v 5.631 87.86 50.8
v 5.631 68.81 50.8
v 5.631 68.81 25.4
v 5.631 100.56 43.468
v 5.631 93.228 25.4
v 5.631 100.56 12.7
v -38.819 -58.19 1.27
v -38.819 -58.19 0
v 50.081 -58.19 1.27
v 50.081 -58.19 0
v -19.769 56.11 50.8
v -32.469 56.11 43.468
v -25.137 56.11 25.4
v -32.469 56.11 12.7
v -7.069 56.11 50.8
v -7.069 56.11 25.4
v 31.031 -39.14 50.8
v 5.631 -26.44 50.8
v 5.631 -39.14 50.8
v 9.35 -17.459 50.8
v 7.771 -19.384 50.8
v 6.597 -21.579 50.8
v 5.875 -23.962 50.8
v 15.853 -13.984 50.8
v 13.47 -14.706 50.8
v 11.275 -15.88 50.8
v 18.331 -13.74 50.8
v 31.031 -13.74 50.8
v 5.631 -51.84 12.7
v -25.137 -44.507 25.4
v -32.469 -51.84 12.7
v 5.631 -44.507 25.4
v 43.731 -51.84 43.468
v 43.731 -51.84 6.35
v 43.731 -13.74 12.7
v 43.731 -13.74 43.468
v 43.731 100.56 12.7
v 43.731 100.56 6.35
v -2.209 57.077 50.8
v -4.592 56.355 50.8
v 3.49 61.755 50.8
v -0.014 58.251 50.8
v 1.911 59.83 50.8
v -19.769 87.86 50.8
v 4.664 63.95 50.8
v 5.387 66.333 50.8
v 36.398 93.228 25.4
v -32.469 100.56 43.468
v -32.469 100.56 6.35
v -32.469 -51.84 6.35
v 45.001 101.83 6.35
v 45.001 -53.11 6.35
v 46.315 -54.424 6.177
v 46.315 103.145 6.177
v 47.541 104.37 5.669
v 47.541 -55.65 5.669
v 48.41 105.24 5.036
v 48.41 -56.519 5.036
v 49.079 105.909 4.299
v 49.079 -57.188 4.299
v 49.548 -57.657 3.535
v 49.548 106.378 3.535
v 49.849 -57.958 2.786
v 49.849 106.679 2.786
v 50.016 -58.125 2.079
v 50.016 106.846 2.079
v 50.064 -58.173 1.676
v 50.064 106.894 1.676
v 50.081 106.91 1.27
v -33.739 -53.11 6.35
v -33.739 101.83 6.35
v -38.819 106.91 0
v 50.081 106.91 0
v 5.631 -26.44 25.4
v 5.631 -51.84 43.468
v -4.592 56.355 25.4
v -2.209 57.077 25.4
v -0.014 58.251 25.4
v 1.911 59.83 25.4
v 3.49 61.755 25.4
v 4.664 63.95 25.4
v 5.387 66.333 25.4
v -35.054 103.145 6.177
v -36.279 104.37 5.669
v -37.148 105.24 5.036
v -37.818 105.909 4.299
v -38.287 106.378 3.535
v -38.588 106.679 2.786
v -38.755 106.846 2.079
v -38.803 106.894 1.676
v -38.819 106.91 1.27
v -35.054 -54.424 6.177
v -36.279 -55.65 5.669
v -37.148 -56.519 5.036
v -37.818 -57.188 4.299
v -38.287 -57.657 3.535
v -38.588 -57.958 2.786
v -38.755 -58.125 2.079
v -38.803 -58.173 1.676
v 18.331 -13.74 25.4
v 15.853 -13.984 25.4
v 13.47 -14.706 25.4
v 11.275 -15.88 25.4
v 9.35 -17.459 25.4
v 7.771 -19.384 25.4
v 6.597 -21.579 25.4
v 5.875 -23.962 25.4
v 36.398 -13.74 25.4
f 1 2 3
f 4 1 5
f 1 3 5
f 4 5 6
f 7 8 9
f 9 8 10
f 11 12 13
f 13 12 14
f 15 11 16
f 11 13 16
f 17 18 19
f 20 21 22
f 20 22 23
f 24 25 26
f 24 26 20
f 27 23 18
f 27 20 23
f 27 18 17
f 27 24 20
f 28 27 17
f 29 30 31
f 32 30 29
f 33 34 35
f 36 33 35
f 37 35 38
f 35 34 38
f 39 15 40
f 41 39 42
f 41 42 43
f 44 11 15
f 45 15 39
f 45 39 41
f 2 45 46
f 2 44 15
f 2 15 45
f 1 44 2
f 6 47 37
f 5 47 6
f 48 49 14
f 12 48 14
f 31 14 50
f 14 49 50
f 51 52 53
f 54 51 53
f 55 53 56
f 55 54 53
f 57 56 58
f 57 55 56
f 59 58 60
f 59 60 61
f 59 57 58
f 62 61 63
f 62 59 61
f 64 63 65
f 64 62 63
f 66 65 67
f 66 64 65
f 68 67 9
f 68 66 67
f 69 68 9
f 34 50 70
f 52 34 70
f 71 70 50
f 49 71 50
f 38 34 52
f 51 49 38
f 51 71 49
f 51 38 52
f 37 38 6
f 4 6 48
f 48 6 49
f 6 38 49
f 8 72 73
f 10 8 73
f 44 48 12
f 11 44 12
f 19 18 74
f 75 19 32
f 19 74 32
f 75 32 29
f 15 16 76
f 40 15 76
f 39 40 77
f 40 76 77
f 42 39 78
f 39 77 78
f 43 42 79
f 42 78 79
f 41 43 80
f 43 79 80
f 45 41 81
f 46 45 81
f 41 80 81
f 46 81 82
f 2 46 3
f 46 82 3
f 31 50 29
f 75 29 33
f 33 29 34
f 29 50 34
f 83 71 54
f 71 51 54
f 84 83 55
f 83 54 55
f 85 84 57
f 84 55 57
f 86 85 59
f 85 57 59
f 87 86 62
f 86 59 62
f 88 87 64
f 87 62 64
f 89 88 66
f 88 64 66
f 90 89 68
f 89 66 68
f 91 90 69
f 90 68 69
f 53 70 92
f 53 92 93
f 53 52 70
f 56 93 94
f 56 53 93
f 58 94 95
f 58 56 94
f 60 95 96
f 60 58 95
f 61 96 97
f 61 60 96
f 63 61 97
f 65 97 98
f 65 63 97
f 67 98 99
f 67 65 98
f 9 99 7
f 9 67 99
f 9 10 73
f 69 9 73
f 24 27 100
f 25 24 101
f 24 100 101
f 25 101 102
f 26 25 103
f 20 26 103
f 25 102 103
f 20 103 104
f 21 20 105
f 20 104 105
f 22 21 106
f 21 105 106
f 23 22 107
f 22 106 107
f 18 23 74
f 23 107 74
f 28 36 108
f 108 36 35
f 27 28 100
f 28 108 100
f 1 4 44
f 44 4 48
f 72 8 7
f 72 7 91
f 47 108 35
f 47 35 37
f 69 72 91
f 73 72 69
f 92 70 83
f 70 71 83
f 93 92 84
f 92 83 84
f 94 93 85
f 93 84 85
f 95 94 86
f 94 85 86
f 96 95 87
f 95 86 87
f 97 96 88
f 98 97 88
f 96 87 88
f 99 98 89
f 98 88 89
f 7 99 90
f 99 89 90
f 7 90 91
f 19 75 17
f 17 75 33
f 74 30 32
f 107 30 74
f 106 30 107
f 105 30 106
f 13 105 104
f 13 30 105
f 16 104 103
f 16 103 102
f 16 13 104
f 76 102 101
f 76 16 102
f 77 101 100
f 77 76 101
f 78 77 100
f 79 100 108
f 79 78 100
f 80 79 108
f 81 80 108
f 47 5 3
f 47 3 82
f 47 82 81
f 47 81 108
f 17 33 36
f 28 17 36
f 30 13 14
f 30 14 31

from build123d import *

# Parameters (mm, degrees)
F0_W     = 88.9
F0_H     = 165.1
F1_DEPTH = 6.35
F2_DEPTH = 25.4
F3_DEPTH = 50.8
F4_R     = 5.08
F5_SIZE2 = 7.3323484187
F5_SIZE  = 12.7
F6_SIZE2 = 7.3323484187
F6_SIZE  = 12.7
F7_SIZE2 = 7.3323484187
F7_SIZE  = 12.7


with BuildPart() as f1:
    # F0 (on Top) → F1 (new body)
    with BuildSketch(Plane.XY):
        with Locations((5.6305658072, 24.3604830414)):
            Rectangle(F0_W, F0_H)
        Polygon((-32.4694341928, 56.1104830414), (-32.4694341928, 100.5604830414), (5.6305658072, 100.5604830414), (43.7305658072, 100.5604830414), (43.7305658072, -13.7395169586), (43.7305658072, -51.8395169586), (5.6305658072, -51.8395169586), (-32.4694341928, -51.8395169586), align=None, mode=Mode.SUBTRACT)
    extrude(amount=F1_DEPTH)

    # F0 (on Top) → F2 (join)
    with BuildSketch(Plane.XY):
        with BuildLine():
            Line((43.7305658072, 100.5604830414), (5.6305658072, 100.5604830414))
            Line((5.6305658072, 100.5604830414), (5.6305658072, 68.8104830414))
            ThreePointArc((5.6305658072, 68.8104830414), (1.9108219283, 59.8302269203), (-7.0694341928, 56.1104830414))
            Line((-7.0694341928, 56.1104830414), (-32.4694341928, 56.1104830414))
            Line((-32.4694341928, 56.1104830414), (-32.4694341928, -51.8395169586))
            Line((-32.4694341928, -51.8395169586), (5.6305658072, -51.8395169586))
            Line((5.6305658072, -51.8395169586), (5.6305658072, -26.4395169586))
            ThreePointArc((5.6305658072, -26.4395169586), (9.3503096862, -17.4592608375), (18.3305658072, -13.7395169586))
            Line((18.3305658072, -13.7395169586), (43.7305658072, -13.7395169586))
            Line((43.7305658072, -13.7395169586), (43.7305658072, 100.5604830414))
        make_face()
    extrude(amount=F2_DEPTH)

    # F0 (on Top) → F3 (join)
    with BuildSketch(Plane.XY):
        with BuildLine():
            Line((43.7305658072, -51.8395169586), (43.7305658072, -13.7395169586))
            Line((43.7305658072, -13.7395169586), (18.3305658072, -13.7395169586))
            ThreePointArc((18.3305658072, -13.7395169586), (9.3503096862, -17.4592608375), (5.6305658072, -26.4395169586))
            Line((5.6305658072, -26.4395169586), (5.6305658072, -51.8395169586))
            Line((5.6305658072, -51.8395169586), (43.7305658072, -51.8395169586))
        make_face()
        with BuildLine():
            Line((5.6305658072, 100.5604830414), (-32.4694341928, 100.5604830414))
            Line((-32.4694341928, 100.5604830414), (-32.4694341928, 56.1104830414))
            Line((-32.4694341928, 56.1104830414), (-7.0694341928, 56.1104830414))
            ThreePointArc((-7.0694341928, 56.1104830414), (1.9108219283, 59.8302269203), (5.6305658072, 68.8104830414))
            Line((5.6305658072, 68.8104830414), (5.6305658072, 100.5604830414))
        make_face()
    extrude(amount=F3_DEPTH)

    # F4
    f4_edges = [f1.edges().sort_by_distance(p)[0] for p in [
        (-38.819434, 24.360483, 6.35),
        (5.630566, -58.189517, 6.35),
        (50.080566, 24.360483, 6.35),
        (5.630566, 106.910483, 6.35),
    ]]
    fillet(f4_edges, radius=F4_R)

    # F5
    f5_edges = [f1.edges().sort_by_distance(p)[0] for p in [
        (43.730566, 43.410483, 25.4),
        (24.680566, 100.560483, 25.4),
        (-32.469434, 2.135483, 25.4),
        (-13.419434, -51.839517, 25.4),
    ]]
    chamfer(f5_edges, length=F5_SIZE, length2=F5_SIZE2)

    # F6
    f6_edges = [f1.edges().sort_by_distance(p)[0] for p in [
        (24.680566, -51.839517, 50.8),
        (43.730566, -32.789517, 50.8),
    ]]
    f6_side = f1.faces().sort_by_distance((25.076608, -33.185559, 50.8))[0]
    chamfer(f6_edges, length=F6_SIZE, length2=F6_SIZE2, reference=f6_side)

    # F7
    f7_edges = [f1.edges().sort_by_distance(p)[0] for p in [
        (-32.469434, 78.335483, 50.8),
        (-13.419434, 100.560483, 50.8),
    ]]
    f7_side = f1.faces().sort_by_distance((-13.757718, 78.740013, 50.8))[0]
    chamfer(f7_edges, length=F7_SIZE, length2=F7_SIZE2, reference=f7_side)


solid = f1.part
